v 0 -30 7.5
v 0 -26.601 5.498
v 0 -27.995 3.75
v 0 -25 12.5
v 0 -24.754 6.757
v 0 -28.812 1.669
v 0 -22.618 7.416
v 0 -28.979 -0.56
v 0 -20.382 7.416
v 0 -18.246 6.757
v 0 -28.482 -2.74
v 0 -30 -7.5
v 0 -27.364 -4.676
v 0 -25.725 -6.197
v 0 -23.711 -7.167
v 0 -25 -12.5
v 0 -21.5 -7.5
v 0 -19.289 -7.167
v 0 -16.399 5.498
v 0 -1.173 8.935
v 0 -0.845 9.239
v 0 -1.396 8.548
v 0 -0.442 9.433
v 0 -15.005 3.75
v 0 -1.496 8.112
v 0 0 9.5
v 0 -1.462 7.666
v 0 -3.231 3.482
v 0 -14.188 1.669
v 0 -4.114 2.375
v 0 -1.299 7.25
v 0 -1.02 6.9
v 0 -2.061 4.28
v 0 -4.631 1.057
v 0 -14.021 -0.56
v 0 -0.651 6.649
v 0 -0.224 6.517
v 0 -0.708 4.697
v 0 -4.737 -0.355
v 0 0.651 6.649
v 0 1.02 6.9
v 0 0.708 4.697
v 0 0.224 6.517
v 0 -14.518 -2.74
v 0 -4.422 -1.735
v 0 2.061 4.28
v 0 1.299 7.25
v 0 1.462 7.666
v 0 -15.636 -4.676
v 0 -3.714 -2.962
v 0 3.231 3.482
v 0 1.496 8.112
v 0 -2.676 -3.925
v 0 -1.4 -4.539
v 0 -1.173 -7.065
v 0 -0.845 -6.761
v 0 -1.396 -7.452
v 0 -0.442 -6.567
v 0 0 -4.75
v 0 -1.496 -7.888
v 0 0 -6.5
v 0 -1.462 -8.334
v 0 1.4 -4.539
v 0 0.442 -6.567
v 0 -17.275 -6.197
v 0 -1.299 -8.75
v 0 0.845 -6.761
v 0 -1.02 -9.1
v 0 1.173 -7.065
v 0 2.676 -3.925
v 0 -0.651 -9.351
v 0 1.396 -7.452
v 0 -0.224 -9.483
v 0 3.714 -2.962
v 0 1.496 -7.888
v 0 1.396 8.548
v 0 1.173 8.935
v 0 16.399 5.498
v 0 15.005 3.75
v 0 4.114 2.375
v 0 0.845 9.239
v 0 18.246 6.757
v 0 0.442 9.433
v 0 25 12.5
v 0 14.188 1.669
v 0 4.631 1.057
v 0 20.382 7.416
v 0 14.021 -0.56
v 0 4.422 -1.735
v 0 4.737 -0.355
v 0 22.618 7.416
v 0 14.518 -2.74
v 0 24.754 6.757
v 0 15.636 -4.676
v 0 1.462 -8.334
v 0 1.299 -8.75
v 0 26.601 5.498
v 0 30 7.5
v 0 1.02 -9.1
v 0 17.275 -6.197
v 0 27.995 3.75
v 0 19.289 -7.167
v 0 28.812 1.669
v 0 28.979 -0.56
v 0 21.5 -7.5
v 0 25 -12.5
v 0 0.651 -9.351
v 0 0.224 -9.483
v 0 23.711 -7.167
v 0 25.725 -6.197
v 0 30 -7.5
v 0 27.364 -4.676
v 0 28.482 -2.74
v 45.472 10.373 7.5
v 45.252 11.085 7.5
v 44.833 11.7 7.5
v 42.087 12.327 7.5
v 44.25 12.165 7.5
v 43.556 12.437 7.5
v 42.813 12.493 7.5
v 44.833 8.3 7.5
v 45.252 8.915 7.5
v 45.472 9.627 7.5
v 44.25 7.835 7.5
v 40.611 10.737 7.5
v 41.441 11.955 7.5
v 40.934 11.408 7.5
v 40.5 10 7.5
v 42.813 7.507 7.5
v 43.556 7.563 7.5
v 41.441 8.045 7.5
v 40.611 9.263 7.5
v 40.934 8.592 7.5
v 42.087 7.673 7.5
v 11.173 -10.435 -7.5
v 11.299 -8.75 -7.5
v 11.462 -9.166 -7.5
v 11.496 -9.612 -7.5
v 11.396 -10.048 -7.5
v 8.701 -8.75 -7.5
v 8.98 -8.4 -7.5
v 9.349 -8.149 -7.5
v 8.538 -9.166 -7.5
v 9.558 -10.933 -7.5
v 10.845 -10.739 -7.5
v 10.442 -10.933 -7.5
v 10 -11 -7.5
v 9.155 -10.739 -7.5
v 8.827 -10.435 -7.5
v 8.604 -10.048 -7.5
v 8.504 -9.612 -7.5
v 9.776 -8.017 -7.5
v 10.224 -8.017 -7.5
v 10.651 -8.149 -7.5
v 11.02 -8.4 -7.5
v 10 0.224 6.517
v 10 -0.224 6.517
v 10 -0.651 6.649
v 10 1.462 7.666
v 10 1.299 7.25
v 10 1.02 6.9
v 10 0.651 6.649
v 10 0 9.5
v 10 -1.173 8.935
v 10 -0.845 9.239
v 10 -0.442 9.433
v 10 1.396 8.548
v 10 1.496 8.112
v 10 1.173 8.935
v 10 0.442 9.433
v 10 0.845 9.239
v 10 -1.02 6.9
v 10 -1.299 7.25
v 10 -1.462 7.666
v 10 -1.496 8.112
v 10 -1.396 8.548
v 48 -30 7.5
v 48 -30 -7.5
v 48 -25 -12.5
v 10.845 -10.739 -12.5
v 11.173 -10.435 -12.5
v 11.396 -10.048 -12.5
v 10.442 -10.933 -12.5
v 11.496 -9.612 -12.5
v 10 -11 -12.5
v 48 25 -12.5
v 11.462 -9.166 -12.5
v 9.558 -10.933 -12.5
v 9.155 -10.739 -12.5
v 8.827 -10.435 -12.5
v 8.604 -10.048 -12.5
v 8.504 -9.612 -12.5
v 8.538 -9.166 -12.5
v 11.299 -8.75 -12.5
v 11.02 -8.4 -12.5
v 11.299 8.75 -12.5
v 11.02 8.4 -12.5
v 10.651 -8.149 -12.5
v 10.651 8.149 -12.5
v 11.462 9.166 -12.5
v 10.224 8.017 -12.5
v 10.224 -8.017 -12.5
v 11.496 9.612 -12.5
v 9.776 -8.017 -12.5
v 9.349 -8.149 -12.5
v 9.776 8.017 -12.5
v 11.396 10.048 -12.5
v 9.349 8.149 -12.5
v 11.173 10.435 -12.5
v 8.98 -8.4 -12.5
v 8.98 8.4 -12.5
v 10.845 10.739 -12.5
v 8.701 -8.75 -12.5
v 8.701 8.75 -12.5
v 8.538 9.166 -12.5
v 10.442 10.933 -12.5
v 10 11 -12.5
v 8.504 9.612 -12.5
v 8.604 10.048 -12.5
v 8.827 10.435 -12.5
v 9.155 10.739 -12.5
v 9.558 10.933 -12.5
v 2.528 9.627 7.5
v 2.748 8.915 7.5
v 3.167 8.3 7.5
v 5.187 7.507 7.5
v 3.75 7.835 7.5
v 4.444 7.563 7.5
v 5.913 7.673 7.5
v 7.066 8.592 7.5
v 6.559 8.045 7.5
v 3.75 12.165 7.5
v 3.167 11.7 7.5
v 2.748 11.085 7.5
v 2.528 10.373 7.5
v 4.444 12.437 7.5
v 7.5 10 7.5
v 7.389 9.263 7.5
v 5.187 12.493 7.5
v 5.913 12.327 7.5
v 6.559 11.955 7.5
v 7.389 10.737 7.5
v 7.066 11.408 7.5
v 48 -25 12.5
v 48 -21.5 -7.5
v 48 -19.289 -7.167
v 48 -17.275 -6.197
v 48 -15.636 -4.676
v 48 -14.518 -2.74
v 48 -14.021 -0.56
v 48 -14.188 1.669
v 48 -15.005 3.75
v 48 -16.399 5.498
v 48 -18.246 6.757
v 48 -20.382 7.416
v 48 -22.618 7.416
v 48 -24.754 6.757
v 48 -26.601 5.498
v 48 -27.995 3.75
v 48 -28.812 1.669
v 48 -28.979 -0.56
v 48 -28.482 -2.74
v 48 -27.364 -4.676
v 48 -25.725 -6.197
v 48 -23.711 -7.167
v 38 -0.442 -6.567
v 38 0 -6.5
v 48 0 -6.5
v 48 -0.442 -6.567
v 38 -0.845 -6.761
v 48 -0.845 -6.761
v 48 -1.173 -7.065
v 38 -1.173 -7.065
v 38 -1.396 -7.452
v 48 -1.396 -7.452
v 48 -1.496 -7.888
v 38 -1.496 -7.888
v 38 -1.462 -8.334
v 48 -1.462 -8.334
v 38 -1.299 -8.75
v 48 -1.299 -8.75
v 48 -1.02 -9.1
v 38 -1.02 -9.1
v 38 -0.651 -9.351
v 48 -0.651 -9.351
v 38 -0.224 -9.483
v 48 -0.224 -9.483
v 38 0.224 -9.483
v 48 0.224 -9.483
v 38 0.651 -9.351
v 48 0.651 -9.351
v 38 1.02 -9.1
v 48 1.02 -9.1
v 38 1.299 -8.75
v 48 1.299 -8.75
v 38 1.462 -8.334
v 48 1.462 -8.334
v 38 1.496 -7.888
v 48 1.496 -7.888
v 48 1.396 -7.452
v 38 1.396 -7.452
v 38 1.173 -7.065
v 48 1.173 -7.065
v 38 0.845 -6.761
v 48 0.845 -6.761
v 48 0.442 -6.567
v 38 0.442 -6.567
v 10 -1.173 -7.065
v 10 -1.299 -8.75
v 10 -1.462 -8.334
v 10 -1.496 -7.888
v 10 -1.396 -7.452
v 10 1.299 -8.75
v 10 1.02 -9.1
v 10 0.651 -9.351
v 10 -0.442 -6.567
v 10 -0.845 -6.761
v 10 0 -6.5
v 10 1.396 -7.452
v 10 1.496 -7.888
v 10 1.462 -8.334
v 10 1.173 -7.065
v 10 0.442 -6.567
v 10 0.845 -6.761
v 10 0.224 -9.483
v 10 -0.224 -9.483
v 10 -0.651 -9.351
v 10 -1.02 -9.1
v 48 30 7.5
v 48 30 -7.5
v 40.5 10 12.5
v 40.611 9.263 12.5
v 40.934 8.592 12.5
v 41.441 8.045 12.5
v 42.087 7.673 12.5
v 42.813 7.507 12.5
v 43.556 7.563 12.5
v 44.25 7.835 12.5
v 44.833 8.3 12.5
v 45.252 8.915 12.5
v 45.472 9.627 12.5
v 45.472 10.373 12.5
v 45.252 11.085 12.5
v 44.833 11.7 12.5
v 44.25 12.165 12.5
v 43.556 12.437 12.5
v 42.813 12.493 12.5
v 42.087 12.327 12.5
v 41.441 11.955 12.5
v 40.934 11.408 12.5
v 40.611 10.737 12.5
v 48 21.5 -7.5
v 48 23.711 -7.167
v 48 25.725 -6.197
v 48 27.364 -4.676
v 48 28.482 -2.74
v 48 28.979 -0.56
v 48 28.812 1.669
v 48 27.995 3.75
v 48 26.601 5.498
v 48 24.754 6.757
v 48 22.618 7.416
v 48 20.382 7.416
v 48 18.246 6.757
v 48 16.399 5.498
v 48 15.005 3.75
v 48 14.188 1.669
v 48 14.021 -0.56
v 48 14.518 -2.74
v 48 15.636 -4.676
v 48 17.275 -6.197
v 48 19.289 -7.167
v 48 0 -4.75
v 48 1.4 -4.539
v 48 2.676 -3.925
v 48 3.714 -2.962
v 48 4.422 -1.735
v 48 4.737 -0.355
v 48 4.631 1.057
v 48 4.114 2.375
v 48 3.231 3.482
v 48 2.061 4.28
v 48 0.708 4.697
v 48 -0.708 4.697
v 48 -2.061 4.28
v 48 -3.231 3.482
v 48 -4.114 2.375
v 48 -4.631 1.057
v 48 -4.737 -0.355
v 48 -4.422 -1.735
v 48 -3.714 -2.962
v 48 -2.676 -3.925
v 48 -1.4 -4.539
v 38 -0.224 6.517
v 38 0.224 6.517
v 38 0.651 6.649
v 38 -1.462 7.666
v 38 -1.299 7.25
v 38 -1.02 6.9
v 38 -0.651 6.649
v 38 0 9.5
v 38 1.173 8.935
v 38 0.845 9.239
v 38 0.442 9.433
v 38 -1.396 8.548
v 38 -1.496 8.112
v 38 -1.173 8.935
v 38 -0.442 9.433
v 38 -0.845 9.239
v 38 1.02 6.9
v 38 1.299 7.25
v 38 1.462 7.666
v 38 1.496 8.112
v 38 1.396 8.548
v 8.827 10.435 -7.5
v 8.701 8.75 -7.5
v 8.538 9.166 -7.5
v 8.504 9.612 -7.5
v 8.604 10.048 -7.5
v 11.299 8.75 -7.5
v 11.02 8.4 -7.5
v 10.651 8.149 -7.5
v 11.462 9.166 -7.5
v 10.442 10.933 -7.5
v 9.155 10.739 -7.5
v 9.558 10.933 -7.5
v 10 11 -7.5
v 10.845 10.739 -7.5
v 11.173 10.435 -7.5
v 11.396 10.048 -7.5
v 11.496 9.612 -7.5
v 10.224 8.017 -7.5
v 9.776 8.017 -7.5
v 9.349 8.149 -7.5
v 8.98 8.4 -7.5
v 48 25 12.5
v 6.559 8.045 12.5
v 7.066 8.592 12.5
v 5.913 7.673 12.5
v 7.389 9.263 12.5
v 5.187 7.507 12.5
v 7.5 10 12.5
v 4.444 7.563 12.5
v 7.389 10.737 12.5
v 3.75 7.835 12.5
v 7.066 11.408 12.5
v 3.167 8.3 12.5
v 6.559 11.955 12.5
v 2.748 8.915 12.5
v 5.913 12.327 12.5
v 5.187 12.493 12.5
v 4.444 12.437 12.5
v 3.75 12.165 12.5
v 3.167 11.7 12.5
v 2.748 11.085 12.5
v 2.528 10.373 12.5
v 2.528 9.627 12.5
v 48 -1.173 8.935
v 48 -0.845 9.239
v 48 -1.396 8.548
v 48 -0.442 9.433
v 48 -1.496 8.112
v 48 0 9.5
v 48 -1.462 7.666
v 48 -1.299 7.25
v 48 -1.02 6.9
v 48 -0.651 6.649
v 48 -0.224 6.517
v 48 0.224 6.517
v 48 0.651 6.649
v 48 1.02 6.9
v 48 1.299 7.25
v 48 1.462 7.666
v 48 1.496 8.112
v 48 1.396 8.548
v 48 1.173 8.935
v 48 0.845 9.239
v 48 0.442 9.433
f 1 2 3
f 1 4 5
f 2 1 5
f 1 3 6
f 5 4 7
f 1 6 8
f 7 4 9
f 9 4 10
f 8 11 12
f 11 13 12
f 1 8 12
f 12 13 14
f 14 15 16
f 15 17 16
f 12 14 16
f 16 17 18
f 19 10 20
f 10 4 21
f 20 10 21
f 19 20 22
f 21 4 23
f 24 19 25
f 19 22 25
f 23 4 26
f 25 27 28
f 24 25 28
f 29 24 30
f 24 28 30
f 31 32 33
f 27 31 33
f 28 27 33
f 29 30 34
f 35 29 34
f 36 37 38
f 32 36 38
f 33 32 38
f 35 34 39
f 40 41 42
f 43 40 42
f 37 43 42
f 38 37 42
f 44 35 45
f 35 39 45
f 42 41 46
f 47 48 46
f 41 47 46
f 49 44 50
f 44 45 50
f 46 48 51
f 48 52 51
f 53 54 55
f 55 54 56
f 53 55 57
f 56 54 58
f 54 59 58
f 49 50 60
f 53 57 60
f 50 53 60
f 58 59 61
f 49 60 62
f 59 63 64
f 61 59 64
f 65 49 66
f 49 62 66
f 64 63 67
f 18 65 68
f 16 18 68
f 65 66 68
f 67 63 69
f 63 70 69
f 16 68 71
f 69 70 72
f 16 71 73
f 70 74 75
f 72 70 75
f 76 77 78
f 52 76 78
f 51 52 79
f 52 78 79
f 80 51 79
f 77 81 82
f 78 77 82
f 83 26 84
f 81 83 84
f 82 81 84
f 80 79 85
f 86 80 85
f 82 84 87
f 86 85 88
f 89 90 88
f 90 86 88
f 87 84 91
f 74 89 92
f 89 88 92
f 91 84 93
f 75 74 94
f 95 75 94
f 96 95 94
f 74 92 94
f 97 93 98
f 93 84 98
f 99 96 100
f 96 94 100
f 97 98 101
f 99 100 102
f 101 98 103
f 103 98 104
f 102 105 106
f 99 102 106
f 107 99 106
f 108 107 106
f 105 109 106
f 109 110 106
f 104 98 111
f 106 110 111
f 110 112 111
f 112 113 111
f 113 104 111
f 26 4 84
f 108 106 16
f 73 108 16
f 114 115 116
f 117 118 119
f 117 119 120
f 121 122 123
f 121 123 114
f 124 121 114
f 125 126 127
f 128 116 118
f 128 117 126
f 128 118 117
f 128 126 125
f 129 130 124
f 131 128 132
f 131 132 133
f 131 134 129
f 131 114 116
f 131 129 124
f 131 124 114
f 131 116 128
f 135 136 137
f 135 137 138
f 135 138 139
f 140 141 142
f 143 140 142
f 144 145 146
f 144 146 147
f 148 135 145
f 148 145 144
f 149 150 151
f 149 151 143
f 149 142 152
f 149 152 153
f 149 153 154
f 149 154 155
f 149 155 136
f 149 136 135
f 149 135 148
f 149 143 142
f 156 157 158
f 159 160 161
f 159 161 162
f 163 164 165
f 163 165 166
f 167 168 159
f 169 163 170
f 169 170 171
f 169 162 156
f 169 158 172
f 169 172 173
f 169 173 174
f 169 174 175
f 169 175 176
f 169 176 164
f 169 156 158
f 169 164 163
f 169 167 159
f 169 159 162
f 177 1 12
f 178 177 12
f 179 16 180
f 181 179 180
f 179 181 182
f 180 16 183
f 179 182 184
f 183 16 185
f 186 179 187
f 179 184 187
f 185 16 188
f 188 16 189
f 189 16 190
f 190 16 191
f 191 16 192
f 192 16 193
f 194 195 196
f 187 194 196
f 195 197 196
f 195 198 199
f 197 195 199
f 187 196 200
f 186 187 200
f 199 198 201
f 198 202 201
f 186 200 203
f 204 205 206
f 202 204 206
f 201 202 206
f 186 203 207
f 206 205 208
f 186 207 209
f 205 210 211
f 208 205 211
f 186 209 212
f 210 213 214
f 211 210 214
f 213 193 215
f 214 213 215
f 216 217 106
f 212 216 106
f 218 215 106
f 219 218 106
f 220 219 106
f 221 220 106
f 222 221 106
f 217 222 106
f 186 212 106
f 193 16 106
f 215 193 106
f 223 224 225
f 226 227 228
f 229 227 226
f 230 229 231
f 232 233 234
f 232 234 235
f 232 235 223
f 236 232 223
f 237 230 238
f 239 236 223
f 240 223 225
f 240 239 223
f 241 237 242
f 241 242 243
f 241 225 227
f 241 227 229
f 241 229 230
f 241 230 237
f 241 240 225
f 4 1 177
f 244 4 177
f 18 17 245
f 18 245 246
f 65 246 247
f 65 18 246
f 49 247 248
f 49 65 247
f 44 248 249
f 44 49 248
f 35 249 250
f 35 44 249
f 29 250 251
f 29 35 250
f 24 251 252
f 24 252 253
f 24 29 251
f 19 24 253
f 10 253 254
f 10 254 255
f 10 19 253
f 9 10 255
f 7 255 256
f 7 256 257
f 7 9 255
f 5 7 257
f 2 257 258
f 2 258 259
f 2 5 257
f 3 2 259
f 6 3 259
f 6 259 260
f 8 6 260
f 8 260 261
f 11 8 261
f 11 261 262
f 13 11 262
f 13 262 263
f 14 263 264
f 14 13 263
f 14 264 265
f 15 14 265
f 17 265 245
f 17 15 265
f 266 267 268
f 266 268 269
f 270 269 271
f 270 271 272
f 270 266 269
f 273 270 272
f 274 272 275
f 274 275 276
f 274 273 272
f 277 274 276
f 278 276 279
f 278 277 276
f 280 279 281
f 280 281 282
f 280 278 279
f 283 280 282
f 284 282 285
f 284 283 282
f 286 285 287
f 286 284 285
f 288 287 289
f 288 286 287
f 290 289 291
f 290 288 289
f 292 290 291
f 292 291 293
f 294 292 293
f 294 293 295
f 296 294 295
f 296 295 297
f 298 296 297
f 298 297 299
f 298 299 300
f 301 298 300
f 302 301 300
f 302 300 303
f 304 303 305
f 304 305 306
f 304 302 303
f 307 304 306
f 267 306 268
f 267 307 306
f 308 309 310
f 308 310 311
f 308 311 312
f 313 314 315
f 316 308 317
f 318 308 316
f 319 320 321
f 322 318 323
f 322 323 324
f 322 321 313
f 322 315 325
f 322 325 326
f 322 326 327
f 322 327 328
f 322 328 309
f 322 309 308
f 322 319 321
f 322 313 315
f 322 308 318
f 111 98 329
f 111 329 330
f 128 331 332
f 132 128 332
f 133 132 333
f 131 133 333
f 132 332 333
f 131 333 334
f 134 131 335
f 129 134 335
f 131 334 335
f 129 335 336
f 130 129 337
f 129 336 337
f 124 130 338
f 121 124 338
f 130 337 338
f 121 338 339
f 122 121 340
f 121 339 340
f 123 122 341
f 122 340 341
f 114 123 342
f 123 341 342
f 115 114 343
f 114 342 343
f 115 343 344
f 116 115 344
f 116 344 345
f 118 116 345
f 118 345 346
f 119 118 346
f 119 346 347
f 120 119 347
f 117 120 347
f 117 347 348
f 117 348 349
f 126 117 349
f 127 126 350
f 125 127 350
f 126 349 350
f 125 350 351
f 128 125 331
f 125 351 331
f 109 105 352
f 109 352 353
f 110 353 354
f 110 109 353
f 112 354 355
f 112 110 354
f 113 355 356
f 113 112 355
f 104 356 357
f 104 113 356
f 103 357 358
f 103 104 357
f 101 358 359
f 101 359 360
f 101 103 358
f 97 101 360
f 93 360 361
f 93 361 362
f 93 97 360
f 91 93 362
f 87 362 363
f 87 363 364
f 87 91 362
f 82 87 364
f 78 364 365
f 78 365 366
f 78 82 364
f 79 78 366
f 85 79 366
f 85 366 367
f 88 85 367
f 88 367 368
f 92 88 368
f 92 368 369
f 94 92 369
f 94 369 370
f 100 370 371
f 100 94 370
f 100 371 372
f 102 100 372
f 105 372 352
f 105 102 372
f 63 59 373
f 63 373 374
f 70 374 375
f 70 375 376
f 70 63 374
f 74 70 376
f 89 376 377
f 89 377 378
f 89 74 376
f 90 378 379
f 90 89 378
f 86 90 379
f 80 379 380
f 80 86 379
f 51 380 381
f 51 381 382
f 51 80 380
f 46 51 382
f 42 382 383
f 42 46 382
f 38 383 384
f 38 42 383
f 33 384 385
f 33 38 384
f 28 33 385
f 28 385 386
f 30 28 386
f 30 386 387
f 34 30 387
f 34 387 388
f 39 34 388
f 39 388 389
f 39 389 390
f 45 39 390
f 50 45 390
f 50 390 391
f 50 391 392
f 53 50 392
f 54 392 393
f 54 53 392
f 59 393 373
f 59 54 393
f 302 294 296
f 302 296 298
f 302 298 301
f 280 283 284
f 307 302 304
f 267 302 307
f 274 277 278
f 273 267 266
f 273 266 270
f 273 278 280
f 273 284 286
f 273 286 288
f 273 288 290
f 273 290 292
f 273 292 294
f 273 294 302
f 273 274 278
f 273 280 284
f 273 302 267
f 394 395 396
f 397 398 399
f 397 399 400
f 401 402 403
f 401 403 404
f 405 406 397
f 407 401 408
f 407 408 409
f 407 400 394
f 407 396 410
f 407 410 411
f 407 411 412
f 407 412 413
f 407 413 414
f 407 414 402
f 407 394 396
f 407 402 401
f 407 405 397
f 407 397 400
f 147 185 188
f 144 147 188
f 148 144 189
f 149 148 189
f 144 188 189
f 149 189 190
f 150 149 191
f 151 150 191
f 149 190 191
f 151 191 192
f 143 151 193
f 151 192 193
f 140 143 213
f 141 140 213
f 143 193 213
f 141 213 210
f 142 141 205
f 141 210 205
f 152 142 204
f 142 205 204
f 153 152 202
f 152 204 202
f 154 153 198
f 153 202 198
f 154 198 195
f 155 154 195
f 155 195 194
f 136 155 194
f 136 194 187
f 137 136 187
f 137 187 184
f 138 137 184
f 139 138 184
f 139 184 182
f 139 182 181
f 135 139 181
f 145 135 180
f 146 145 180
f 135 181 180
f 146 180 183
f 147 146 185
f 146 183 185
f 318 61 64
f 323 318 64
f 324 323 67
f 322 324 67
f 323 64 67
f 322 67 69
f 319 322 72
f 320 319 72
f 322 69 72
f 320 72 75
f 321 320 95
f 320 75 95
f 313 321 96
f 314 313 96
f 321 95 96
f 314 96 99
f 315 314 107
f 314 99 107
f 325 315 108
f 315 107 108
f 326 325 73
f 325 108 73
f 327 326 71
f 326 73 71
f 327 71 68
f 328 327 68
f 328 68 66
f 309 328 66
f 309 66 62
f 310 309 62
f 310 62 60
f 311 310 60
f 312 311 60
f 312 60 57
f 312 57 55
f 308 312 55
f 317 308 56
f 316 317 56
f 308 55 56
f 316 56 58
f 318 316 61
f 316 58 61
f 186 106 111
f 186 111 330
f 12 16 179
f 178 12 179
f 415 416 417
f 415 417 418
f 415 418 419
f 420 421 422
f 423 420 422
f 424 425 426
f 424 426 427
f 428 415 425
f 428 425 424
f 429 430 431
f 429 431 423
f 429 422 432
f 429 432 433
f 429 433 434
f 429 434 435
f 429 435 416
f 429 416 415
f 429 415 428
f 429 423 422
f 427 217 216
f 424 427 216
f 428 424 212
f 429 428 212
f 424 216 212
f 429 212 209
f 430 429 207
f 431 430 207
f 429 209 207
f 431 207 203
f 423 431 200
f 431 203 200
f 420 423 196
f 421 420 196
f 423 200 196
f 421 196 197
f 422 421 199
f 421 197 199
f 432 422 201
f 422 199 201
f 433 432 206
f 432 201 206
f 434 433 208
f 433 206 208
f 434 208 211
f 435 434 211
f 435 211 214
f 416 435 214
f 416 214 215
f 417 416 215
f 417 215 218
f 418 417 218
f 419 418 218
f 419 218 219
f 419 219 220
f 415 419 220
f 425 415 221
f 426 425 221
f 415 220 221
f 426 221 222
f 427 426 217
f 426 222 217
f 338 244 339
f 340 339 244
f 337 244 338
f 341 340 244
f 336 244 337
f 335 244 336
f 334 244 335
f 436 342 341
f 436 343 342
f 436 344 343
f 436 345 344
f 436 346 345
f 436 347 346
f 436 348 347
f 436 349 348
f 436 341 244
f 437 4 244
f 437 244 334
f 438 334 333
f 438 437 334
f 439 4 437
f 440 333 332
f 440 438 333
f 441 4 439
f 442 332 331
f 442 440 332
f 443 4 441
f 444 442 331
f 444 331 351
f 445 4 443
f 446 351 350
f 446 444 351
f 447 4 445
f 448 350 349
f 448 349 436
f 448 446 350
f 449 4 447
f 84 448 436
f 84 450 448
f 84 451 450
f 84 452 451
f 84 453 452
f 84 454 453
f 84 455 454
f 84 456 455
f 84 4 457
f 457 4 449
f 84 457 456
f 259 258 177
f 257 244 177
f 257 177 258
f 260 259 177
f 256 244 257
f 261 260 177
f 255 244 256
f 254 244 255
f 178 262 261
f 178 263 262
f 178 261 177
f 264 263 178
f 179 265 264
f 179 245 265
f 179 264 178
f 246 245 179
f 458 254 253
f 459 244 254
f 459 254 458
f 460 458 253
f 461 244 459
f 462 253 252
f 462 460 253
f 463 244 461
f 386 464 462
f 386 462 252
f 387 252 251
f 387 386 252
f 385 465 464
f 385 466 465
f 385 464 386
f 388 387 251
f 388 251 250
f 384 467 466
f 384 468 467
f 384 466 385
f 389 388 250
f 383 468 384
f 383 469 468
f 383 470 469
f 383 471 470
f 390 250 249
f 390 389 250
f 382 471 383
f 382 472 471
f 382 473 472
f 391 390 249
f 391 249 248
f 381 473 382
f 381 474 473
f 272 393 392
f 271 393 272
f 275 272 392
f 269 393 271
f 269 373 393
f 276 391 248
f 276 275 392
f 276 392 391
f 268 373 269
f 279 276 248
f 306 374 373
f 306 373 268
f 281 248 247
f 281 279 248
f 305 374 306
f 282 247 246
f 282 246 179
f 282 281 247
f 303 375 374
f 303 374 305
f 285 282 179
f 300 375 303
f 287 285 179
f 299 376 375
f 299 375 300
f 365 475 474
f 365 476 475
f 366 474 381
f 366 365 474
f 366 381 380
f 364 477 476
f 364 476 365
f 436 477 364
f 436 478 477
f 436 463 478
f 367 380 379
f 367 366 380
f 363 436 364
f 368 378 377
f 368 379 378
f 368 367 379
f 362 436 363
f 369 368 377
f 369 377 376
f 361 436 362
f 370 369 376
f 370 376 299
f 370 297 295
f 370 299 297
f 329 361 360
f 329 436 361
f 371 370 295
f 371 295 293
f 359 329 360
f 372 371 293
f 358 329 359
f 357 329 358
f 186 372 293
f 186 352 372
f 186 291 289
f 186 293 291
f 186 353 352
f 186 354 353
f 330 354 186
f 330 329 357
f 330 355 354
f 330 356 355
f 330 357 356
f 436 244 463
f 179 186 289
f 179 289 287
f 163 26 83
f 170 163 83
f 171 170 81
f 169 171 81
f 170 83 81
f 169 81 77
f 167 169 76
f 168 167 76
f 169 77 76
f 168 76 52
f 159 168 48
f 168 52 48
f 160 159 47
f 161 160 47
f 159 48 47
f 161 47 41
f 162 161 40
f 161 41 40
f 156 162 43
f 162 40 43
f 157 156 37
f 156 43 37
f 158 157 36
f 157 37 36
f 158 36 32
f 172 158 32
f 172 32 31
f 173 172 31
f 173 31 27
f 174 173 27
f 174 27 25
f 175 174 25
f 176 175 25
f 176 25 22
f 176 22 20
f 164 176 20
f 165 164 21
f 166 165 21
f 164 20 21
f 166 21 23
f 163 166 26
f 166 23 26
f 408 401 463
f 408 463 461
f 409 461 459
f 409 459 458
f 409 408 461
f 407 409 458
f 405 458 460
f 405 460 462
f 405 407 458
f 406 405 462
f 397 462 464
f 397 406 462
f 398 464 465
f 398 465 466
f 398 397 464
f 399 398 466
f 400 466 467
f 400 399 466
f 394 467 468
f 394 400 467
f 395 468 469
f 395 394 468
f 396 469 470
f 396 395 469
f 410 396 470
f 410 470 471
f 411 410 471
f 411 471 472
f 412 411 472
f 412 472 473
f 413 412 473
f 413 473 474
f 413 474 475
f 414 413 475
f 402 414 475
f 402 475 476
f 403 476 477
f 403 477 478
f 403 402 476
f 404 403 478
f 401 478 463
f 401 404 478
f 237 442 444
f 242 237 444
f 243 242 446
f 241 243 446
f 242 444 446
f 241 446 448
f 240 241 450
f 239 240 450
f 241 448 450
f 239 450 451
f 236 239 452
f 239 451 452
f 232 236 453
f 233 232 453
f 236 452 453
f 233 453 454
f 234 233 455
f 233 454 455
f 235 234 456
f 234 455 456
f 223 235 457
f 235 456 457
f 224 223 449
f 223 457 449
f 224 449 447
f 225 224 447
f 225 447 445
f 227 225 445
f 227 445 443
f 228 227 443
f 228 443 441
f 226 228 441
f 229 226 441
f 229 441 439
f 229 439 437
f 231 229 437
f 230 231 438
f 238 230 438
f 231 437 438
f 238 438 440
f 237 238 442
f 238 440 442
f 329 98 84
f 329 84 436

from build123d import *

# Parameters (mm, degrees)
SKETCH_1_W          = 25
SKETCH_1_H          = 60
SKETCH_1_R          = 4.75
SKETCH_1_R_2        = 7.5
EXTRUDE_1_DEPTH     = 48
SKETCH_2_R          = 1.5
CUT_EXTRUDE_1_DEPTH = 10
CUT_EXTRUDE_START   = -10
SKETCH_3_R          = 1.5
CUT_EXTRUDE_2_DEPTH = 10
CHAMFER_1_SIZE      = 5
SKETCH_4_R          = 2.5
CUT_EXTRUDE_3_DEPTH = 5
SKETCH_5_R          = 1.5
CUT_EXTRUDE_4_DEPTH = 5


with BuildPart() as part:
    # 草图1 → 凸台-拉伸1 (new body)
    with BuildSketch(Plane(origin=(0, 0, 0), x_dir=(0, 0, -1), z_dir=(1, 0, 0))):
        Rectangle(SKETCH_1_W, SKETCH_1_H)
        Circle(SKETCH_1_R, mode=Mode.SUBTRACT)
        with Locations((0, 21.5)):
            Circle(SKETCH_1_R_2, mode=Mode.SUBTRACT)
        with Locations((0, -21.5)):
            Circle(SKETCH_1_R_2, mode=Mode.SUBTRACT)
    extrude(amount=EXTRUDE_1_DEPTH)

    # 草图2 → 切除-拉伸1 (cut)
    with BuildSketch(Plane.ZY):
        with Locations((8, 0)):
            Circle(SKETCH_2_R)
        with Locations((-8, 0)):
            Circle(SKETCH_2_R)
    extrude(amount=-CUT_EXTRUDE_1_DEPTH, mode=Mode.SUBTRACT)

    # 草图3 → 切除-拉伸2 (cut)
    with BuildSketch(Plane(origin=(48, 0, 0), x_dir=(0, 0, -1), z_dir=(1, 0, 0)).offset(CUT_EXTRUDE_START)):
        with Locations(Location((8, 0, 0), (0, 0, 180))):
            Circle(SKETCH_3_R)
        with Locations(Location((-8, 0, 0), (0, 0, 180))):
            Circle(SKETCH_3_R)
    extrude(amount=CUT_EXTRUDE_2_DEPTH, mode=Mode.SUBTRACT)

    # 倒角1
    chamfer_1_edges = [part.edges().sort_by_distance(p)[0] for p in [
        (24, 30, 12.5),
        (24, 30, -12.5),
        (24, -30, -12.5),
        (24, -30, 12.5),
    ]]
    chamfer(chamfer_1_edges, length=CHAMFER_1_SIZE)

    # 草图4 → 切除-拉伸3 (cut)
    with BuildSketch(Plane.XY.offset(12.5)):
        with Locations((5, 10)):
            Circle(SKETCH_4_R)
        with Locations(Location((43, 10, 0), (0, 0, 180))):
            Circle(SKETCH_4_R)
    extrude(amount=-CUT_EXTRUDE_3_DEPTH, mode=Mode.SUBTRACT)

    # 草图5 → 切除-拉伸4 (cut)
    with BuildSketch(Plane(origin=(0, 0, -12.5), x_dir=(-1, 0, 0), z_dir=(0, 0, -1))):
        with Locations(Location((-10, 9.5, 0), (0, 0, 90))):
            Circle(SKETCH_5_R)
        with Locations(Location((-10, -9.5, 0), (0, 0, 270))):
            Circle(SKETCH_5_R)
    extrude(amount=-CUT_EXTRUDE_4_DEPTH, mode=Mode.SUBTRACT)


solid = part.part
